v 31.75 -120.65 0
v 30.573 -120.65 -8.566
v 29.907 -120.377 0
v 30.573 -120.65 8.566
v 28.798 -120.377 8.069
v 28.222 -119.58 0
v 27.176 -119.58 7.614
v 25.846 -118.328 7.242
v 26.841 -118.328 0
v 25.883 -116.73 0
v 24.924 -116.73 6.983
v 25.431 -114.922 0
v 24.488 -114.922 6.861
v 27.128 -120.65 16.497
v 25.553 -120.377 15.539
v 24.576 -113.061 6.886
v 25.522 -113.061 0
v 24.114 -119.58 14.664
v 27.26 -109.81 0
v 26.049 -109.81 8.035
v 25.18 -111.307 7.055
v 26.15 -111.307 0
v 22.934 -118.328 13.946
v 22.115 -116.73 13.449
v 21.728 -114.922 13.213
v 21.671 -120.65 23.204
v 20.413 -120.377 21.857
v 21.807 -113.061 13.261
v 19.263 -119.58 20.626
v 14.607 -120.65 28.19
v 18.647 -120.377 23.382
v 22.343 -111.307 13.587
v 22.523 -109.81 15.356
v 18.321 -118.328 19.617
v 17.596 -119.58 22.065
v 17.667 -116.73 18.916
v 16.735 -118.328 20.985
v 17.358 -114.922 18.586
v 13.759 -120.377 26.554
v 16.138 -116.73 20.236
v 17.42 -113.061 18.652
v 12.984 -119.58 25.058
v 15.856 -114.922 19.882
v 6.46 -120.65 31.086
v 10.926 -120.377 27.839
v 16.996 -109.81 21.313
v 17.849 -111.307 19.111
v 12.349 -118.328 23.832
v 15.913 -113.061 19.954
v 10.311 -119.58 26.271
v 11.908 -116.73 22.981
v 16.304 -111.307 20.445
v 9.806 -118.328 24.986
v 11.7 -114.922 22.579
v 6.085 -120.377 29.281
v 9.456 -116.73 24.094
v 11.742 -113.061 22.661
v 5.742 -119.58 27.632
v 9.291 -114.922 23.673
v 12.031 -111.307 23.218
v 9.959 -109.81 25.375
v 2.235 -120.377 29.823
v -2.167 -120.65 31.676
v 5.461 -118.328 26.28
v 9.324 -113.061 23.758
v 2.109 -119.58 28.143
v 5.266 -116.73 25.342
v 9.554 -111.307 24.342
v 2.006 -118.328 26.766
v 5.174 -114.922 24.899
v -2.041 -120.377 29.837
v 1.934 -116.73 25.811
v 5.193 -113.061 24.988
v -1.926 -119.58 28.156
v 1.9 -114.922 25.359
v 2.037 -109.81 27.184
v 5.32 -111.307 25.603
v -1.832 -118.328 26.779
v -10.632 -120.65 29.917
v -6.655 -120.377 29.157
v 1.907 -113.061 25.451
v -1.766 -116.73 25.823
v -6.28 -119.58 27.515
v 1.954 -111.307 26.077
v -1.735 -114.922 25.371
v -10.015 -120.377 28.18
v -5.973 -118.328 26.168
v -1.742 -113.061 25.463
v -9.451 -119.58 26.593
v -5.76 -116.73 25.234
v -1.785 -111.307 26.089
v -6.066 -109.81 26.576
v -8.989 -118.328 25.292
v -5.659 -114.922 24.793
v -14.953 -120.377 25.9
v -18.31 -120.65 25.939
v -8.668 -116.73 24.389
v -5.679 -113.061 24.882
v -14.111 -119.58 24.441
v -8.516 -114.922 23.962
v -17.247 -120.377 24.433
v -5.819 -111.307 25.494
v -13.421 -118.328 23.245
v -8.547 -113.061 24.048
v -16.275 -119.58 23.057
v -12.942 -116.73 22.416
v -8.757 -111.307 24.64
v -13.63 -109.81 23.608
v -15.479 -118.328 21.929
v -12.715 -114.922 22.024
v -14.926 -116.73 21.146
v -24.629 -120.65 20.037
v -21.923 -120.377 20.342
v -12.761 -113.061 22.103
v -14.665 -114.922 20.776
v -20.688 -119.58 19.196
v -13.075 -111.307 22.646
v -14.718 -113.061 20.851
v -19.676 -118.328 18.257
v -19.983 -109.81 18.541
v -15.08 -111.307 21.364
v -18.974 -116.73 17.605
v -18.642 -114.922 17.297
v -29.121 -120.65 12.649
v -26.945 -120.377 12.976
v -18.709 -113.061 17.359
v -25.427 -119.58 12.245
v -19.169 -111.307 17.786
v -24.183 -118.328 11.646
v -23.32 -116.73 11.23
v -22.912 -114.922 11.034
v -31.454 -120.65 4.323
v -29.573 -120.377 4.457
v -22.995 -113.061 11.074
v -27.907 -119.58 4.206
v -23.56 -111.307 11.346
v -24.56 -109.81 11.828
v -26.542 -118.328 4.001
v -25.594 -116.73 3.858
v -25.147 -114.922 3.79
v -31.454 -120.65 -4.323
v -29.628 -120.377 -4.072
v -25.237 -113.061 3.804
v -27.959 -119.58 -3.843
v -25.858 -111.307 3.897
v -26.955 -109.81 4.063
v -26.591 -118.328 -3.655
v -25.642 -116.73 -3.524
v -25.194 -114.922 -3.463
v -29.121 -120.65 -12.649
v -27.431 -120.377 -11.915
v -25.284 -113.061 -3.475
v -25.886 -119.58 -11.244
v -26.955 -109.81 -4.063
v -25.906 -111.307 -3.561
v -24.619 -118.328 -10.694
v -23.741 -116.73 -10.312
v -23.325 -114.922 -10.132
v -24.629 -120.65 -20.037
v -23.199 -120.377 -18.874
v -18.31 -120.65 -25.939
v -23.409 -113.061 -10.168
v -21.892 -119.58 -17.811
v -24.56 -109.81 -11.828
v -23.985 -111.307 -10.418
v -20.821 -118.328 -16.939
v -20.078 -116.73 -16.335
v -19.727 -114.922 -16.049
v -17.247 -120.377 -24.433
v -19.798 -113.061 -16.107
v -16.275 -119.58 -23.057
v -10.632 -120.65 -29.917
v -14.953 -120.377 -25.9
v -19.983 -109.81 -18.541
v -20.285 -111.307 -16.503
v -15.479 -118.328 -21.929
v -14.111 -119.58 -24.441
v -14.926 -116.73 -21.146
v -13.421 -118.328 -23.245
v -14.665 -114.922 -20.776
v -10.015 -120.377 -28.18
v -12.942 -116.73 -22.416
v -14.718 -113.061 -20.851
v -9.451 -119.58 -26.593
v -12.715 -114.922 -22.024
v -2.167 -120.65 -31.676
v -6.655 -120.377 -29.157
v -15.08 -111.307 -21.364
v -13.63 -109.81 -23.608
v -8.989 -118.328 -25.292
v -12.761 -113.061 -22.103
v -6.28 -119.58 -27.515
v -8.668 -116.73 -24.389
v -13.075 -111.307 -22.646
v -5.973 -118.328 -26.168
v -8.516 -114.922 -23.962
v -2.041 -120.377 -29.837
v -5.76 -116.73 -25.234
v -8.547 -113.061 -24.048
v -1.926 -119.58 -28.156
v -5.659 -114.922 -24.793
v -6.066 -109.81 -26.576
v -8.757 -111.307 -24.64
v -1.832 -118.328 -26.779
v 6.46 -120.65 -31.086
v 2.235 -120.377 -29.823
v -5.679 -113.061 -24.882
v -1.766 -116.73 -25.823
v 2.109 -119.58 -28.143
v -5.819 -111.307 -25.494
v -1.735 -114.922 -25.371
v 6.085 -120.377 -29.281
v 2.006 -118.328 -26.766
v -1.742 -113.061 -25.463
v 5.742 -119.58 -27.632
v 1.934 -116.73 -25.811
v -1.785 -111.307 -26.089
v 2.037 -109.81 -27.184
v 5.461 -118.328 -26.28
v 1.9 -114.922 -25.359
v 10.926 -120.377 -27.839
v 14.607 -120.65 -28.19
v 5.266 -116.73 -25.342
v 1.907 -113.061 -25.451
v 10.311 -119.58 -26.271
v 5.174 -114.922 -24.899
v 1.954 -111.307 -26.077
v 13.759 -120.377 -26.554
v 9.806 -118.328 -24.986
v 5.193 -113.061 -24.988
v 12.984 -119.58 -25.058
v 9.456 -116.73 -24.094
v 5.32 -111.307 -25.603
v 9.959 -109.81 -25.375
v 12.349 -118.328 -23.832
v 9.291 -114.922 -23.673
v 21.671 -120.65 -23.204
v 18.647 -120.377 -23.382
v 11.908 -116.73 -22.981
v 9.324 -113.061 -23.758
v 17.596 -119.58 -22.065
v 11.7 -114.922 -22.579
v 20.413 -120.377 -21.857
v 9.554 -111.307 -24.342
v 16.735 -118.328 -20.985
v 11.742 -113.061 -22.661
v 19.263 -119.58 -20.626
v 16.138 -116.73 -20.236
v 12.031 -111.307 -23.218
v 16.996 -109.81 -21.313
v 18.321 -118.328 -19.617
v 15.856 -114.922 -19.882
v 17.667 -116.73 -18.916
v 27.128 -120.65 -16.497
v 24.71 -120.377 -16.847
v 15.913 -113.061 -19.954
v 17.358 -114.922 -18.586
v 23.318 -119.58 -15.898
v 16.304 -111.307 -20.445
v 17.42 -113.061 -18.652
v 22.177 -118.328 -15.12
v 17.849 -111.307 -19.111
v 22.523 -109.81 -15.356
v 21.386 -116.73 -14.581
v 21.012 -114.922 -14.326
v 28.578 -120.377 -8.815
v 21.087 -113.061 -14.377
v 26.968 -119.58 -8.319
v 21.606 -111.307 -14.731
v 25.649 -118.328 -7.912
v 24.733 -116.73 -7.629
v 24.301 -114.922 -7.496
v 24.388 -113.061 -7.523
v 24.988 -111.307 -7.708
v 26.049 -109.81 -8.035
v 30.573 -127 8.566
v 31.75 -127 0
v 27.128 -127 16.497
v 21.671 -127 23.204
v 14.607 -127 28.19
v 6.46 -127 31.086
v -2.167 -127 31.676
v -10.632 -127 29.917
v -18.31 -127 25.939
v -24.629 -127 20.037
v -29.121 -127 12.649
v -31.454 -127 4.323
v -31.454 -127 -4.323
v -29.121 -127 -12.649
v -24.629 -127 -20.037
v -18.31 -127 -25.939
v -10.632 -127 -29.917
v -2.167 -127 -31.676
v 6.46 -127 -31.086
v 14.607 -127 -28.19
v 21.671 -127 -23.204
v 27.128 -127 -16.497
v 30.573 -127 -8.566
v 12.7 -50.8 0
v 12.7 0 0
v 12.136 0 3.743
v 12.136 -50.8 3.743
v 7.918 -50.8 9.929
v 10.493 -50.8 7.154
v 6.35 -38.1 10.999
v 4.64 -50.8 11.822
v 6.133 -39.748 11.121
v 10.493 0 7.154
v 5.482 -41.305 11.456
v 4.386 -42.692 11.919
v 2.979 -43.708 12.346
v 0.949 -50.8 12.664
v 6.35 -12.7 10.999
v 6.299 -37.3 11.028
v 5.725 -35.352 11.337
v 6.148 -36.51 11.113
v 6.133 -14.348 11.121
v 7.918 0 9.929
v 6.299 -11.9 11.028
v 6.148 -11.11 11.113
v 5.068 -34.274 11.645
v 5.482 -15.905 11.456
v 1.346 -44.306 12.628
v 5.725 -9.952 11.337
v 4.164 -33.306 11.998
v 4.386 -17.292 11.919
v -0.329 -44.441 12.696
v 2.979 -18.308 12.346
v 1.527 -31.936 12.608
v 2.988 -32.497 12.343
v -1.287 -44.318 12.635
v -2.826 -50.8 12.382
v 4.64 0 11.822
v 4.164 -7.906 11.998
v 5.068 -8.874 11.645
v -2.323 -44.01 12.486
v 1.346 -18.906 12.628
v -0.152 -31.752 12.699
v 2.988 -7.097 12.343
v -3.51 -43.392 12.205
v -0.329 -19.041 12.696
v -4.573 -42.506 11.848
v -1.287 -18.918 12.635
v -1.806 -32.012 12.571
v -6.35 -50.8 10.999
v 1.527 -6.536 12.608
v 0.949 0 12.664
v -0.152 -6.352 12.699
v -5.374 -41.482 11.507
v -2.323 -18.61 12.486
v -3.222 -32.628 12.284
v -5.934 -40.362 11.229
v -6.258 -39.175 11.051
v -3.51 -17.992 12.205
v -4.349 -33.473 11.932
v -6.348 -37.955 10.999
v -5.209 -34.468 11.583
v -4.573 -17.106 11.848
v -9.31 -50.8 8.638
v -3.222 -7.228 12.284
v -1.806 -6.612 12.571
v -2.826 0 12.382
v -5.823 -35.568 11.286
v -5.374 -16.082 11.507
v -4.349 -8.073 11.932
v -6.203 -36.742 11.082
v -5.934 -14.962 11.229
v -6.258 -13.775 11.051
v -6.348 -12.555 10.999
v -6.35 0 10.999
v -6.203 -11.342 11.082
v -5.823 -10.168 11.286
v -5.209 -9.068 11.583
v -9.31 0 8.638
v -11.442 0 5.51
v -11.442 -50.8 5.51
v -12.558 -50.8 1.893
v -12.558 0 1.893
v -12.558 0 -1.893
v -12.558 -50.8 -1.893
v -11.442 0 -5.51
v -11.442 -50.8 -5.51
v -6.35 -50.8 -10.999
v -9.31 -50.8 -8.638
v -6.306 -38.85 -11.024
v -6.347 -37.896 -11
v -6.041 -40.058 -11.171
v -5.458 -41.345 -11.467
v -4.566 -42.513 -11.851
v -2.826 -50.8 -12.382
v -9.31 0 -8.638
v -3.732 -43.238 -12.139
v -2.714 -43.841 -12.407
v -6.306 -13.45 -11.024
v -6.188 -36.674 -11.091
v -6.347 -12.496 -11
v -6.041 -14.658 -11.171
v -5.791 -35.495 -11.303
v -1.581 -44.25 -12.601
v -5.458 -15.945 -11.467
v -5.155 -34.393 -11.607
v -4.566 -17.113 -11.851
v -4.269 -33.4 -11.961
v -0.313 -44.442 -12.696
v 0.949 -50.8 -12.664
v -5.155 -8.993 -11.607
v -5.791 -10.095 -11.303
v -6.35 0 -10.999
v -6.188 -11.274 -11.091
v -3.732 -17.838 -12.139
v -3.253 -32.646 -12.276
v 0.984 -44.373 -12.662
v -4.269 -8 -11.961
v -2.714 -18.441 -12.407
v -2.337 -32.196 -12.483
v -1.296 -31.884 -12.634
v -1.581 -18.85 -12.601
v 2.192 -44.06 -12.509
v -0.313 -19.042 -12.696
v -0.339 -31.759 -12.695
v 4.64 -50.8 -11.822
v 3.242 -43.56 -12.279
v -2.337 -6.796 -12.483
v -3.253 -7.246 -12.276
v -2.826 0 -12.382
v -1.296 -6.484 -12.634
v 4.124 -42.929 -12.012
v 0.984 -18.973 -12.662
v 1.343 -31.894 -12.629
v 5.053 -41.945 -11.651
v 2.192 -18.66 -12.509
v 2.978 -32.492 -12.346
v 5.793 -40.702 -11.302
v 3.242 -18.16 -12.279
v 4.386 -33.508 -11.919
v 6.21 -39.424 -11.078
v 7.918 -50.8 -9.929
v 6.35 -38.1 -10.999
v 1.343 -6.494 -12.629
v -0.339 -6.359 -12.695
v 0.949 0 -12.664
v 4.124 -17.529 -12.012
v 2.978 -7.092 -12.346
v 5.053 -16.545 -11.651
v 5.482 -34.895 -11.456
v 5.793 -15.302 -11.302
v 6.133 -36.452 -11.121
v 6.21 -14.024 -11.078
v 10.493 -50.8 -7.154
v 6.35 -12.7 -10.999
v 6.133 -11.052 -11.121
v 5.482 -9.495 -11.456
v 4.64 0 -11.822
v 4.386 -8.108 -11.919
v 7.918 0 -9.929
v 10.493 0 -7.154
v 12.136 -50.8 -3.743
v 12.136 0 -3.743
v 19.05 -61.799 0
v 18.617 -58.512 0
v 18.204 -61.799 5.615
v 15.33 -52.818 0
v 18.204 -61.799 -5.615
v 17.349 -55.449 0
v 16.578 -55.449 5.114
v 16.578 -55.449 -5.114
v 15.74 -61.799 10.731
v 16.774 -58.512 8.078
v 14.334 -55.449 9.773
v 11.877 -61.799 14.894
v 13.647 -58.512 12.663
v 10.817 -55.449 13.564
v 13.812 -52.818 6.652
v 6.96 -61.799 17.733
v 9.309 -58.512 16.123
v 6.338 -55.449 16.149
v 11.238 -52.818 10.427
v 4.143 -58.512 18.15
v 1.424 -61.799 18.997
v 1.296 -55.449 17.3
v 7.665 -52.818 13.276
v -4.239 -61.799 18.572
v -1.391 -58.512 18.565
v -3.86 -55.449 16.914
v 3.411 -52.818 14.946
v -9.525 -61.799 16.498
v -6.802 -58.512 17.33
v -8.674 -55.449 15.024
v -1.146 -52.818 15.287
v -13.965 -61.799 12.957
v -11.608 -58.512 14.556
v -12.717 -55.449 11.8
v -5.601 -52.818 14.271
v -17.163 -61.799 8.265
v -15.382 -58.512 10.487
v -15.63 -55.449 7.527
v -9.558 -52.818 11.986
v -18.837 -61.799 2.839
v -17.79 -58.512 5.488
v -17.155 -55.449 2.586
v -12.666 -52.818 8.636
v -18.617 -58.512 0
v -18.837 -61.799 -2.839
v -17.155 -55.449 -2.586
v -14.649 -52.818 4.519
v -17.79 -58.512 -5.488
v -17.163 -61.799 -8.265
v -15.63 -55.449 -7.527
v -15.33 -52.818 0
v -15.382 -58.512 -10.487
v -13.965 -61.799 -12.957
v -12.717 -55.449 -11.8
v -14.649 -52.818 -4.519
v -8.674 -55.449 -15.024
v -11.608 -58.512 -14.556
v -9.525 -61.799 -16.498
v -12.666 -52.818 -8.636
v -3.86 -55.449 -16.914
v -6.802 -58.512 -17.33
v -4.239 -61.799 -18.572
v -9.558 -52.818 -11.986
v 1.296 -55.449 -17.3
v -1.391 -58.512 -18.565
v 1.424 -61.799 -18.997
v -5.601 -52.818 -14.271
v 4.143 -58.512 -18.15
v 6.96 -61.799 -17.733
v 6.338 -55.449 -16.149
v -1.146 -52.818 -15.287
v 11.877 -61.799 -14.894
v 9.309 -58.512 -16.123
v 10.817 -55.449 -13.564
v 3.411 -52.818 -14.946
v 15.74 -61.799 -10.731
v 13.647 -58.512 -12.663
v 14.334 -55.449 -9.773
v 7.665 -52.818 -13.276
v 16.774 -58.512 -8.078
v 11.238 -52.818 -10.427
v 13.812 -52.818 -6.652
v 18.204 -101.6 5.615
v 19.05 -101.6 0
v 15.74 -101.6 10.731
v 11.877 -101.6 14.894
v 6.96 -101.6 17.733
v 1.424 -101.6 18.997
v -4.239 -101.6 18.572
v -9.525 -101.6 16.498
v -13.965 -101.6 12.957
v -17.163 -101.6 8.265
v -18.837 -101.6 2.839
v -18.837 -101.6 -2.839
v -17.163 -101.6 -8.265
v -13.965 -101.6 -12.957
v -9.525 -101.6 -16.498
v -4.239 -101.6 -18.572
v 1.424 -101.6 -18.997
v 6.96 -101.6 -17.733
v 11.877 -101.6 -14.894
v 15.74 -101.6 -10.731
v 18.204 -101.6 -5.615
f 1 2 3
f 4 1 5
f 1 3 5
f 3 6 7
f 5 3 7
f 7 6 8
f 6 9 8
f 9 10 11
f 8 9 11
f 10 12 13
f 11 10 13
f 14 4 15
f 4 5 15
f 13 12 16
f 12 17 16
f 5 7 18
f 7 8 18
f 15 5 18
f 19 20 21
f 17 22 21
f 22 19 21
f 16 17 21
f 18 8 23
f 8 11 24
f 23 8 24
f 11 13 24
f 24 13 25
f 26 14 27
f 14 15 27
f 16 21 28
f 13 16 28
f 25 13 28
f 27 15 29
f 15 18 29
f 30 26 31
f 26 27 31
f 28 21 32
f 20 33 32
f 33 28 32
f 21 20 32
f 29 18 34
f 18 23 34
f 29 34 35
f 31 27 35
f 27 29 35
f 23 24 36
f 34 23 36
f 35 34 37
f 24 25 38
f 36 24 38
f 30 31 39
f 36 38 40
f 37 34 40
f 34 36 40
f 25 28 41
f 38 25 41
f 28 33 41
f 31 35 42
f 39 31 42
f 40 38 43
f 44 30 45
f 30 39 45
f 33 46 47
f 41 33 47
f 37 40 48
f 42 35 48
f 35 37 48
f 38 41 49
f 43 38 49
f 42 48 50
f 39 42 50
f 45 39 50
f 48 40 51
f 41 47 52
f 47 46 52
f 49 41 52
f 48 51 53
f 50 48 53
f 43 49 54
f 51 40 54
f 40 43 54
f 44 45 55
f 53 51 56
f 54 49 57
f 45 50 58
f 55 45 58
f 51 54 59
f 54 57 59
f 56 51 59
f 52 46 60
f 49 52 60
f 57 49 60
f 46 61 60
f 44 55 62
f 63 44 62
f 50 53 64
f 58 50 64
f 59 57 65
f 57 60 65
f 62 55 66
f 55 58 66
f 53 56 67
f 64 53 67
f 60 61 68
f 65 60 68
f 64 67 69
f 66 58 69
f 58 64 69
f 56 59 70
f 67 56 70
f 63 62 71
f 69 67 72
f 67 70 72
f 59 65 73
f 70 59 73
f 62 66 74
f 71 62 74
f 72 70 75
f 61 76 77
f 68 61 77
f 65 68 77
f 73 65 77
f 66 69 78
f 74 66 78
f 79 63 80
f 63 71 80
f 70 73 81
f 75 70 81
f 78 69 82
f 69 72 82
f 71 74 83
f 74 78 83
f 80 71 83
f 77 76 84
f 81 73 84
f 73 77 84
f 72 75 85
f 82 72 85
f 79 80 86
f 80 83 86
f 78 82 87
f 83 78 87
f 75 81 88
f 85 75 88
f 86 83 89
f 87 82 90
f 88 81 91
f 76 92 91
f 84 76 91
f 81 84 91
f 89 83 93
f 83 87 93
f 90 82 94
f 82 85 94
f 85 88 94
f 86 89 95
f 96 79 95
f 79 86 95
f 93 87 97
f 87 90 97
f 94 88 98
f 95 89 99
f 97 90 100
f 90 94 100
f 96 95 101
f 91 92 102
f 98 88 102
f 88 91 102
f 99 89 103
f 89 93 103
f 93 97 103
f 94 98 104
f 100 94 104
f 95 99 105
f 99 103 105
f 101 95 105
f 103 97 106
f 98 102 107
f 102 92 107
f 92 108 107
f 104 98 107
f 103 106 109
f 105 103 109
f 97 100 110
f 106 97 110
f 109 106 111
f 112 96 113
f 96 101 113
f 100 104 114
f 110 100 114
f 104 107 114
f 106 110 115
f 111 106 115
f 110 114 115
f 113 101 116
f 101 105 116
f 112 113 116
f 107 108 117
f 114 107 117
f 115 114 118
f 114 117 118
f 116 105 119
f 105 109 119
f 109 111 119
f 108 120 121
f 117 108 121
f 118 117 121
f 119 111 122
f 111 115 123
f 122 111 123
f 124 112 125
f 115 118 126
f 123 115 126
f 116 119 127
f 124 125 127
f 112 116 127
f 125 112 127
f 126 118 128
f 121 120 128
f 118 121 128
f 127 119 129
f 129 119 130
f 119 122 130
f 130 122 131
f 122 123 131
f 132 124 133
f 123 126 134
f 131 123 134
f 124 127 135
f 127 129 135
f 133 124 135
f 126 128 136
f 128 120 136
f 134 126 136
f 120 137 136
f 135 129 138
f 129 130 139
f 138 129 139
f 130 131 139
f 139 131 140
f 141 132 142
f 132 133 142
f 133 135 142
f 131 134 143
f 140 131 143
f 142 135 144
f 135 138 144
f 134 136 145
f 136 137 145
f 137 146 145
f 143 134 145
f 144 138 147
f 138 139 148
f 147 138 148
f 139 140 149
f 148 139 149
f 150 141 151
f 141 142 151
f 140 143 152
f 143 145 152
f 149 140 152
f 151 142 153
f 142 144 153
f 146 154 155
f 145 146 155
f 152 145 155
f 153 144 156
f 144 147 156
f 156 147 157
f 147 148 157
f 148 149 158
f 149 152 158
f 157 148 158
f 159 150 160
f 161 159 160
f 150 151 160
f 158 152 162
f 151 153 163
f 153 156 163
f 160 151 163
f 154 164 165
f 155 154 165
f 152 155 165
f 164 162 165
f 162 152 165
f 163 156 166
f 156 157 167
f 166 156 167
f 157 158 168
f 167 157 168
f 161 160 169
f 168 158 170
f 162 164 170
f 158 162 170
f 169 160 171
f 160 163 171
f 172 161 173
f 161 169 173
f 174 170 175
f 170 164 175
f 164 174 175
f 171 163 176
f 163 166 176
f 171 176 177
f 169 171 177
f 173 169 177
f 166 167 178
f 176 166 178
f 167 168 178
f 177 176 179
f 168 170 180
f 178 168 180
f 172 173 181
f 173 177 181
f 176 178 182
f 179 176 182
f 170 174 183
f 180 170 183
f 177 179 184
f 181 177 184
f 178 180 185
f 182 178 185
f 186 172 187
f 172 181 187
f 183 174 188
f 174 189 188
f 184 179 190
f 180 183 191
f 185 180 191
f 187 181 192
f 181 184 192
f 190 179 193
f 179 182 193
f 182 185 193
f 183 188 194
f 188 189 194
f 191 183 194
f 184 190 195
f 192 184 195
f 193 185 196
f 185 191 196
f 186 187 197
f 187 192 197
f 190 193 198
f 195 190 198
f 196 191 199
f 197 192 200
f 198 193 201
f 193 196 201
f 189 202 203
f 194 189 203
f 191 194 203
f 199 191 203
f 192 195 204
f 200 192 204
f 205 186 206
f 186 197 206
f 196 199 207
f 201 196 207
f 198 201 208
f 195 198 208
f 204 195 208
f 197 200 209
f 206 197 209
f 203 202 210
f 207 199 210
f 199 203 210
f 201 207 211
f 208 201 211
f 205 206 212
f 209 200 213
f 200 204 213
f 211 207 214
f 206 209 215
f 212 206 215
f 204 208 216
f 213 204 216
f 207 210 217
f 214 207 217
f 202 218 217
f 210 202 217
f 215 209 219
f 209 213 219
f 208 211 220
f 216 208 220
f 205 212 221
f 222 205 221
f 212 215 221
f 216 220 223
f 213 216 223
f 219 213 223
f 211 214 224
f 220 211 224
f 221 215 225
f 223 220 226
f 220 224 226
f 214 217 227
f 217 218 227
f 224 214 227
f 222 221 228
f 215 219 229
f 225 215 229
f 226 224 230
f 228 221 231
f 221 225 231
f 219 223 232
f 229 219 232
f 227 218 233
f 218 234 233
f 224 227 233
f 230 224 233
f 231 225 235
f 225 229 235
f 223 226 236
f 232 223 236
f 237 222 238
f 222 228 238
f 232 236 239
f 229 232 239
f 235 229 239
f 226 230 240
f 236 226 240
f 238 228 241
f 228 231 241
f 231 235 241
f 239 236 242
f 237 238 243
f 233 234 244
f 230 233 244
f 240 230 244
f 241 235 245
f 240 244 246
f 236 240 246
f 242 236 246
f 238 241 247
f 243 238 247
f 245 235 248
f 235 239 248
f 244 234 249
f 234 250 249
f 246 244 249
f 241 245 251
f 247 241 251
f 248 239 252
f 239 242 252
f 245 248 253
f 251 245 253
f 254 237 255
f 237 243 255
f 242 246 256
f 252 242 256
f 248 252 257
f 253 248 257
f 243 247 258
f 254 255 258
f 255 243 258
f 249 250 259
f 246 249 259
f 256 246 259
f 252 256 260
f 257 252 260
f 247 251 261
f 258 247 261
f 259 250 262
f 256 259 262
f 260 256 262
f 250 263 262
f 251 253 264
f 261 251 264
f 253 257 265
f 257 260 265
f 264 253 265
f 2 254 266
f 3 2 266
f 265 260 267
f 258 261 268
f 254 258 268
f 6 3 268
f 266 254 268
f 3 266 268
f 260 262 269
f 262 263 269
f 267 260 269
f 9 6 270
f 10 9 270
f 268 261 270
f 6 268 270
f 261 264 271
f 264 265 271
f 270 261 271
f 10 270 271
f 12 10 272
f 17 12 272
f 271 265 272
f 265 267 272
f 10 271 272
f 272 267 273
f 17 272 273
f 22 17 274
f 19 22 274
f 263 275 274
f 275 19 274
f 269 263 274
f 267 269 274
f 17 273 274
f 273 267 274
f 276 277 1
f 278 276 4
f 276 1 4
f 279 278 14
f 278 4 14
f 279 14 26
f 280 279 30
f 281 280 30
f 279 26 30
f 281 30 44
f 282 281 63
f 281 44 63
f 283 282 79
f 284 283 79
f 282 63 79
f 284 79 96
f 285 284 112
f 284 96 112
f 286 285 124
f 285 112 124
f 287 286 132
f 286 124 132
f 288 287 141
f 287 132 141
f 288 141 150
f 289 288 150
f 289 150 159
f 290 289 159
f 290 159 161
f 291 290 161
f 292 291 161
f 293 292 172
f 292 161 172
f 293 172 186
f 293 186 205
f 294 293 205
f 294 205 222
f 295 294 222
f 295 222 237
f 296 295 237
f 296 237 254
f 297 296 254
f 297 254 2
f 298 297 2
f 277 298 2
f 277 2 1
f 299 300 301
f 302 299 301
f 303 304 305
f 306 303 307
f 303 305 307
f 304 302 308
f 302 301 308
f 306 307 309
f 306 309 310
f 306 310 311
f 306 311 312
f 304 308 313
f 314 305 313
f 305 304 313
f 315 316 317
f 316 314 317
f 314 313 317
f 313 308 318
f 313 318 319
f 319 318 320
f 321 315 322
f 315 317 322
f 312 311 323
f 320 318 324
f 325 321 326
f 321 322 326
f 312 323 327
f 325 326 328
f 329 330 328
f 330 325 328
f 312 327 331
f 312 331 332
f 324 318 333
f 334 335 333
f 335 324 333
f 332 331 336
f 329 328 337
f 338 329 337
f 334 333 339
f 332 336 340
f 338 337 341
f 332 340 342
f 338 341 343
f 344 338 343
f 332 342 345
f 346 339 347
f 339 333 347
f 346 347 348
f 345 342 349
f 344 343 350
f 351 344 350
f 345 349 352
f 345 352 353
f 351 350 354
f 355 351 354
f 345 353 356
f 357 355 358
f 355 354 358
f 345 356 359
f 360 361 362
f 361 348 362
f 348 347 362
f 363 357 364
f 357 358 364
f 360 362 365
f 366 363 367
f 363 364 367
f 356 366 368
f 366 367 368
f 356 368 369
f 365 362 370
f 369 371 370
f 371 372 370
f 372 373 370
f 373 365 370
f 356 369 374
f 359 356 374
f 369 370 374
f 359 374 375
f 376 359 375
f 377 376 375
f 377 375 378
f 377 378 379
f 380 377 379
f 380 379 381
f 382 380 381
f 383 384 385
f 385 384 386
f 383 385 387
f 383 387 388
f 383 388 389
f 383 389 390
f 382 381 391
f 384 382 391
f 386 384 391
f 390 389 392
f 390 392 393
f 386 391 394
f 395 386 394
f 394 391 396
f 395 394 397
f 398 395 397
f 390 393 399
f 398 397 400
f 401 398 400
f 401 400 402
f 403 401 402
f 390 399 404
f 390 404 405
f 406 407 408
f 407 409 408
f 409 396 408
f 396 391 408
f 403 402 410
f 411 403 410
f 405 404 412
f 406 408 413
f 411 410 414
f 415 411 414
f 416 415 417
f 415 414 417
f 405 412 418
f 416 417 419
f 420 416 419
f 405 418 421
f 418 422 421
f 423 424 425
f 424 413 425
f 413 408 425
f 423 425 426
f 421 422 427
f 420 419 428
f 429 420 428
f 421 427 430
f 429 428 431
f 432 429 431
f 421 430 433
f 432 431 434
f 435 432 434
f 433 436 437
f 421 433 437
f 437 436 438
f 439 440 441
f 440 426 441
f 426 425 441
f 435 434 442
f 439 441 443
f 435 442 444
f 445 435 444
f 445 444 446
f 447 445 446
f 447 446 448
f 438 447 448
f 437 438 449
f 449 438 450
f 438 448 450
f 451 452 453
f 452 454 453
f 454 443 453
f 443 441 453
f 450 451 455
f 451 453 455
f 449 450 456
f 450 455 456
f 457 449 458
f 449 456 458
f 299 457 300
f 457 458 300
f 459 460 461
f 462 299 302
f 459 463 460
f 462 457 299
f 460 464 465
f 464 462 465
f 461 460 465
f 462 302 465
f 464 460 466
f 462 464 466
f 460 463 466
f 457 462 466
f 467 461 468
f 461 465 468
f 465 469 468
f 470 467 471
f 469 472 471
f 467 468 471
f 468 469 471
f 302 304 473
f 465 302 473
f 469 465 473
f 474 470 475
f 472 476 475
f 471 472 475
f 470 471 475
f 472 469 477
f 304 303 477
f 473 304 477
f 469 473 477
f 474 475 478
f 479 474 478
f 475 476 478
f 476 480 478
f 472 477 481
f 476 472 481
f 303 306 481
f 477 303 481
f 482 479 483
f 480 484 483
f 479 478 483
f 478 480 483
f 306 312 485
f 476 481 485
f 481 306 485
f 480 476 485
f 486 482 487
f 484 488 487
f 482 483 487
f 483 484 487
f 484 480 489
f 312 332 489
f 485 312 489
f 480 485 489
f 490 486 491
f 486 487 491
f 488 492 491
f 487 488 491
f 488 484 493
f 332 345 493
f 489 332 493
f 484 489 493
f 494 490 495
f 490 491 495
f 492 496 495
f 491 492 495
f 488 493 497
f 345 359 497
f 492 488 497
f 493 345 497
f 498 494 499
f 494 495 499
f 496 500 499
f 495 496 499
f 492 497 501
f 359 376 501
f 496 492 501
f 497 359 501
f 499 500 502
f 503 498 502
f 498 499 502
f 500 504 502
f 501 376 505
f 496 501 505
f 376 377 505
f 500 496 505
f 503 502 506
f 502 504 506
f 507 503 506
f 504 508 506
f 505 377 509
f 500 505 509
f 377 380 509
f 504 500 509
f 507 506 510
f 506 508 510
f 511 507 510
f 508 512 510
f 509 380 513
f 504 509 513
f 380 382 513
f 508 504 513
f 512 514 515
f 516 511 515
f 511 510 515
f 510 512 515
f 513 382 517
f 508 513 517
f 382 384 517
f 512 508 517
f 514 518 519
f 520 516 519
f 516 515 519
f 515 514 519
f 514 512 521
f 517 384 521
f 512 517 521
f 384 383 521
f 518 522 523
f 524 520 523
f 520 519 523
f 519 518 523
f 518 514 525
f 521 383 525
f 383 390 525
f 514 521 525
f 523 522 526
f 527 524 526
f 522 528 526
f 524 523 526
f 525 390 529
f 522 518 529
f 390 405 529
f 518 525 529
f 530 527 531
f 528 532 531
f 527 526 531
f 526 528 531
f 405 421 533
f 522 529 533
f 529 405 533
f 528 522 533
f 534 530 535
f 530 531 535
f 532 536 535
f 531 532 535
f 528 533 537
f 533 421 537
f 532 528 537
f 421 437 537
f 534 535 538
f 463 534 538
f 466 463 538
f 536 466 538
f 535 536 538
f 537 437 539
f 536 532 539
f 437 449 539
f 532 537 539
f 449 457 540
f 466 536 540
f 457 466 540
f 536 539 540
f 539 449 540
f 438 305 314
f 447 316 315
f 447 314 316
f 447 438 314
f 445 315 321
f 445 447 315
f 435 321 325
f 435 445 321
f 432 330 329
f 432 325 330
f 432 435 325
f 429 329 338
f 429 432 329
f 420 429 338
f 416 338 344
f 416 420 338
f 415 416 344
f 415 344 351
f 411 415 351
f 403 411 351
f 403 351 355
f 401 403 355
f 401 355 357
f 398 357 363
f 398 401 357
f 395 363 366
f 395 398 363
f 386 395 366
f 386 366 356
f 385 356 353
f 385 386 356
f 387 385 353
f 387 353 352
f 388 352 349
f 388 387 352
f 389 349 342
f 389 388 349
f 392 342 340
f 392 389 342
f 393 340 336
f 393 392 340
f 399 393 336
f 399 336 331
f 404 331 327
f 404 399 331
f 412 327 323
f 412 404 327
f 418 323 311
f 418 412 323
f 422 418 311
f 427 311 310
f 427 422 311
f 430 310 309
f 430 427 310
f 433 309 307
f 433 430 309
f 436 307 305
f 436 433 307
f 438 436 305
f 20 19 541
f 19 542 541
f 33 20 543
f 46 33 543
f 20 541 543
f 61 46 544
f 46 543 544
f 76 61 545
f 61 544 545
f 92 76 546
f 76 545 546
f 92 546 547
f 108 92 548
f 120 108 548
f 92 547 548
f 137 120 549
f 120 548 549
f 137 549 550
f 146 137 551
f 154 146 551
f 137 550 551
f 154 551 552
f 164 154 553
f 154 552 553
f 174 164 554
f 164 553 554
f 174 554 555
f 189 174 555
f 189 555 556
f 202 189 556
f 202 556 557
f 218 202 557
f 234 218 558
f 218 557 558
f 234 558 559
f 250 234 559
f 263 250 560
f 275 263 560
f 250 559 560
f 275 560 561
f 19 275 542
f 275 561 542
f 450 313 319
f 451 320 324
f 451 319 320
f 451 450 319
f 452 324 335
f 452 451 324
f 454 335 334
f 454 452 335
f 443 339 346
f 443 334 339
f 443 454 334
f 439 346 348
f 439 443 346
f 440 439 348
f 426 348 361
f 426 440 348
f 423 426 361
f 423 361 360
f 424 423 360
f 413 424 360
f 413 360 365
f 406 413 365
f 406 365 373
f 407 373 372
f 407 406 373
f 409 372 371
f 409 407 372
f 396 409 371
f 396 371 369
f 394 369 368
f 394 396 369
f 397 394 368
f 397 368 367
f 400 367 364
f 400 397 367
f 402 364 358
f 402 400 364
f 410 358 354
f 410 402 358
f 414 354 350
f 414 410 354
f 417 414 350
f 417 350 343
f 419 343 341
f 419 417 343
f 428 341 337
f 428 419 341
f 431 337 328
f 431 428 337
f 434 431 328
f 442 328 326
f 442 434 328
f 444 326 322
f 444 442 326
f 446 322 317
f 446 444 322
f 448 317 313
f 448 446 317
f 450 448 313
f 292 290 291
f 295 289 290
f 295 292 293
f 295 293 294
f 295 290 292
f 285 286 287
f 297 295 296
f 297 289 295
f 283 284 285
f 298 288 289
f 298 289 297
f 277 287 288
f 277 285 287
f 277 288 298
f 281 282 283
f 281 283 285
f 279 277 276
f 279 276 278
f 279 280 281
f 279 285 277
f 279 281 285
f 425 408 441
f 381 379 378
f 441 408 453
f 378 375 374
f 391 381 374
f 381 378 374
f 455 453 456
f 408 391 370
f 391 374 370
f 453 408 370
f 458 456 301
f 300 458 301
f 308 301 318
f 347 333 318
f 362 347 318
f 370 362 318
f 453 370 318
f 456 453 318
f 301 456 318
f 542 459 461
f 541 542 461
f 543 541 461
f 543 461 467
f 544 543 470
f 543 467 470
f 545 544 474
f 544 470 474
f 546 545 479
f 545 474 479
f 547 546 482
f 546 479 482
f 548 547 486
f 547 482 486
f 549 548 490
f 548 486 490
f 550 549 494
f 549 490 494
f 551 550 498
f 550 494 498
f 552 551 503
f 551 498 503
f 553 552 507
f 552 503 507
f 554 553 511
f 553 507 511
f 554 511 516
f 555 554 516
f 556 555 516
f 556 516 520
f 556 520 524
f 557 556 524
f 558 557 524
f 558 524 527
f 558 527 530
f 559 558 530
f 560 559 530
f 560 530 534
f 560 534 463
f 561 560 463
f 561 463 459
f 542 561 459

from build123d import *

# Parameters (mm, degrees)
F0_R          = 12.7
F1_DEPTH      = 50.8
F2_R          = 19.05
F3_DEPTH      = 50.8
F4_R          = 31.75
F5_DEPTH      = 25.4
F6_R          = 6.35
F7_DEPTH      = 12.7
F7_DEPTH_BACK = 12.7
F8_R          = 6.35
F9_DEPTH      = 12.7
F9_DEPTH_BACK = 12.7
F13_R         = 6.35
F15_S5_R      = 19.05
F15_T6_DEPTH  = 47


# Not quite as in the source:
# - a fillet or chamfer that OpenCascade refuses, or shapes differently, is made with other operations: its cross-section is extruded or revolved along the edge and cut away or added


with BuildPart() as f1:
    # F0 (on Front) → F1 (new body)
    with BuildSketch(Plane.XZ):
        Circle(F0_R)
    extrude(amount=F1_DEPTH)

    # F2 (on face) → F3 (join)
    with BuildSketch(Plane.XZ.offset(50.8)):
        Circle(F2_R)
    extrude(amount=F3_DEPTH)

    # F4 (on face) → F5 (join)
    with BuildSketch(Plane.XZ.offset(101.6)):
        Circle(F4_R)
    extrude(amount=F5_DEPTH)

    # F6 (on Top) → F7 (cut, two sides)
    with BuildSketch(Plane.XY) as f7_sk:
        with Locations((0, -38.1)):
            Circle(F6_R)
    extrude(amount=-F7_DEPTH, mode=Mode.SUBTRACT)
    extrude(f7_sk.sketch, amount=F7_DEPTH_BACK, mode=Mode.SUBTRACT)

    # F8 (on Top) → F9 (cut, two sides)
    with BuildSketch(Plane.XY) as f9_sk:
        with Locations((0, -12.7)):
            Circle(F8_R)
    extrude(amount=-F9_DEPTH, mode=Mode.SUBTRACT)
    extrude(f9_sk.sketch, amount=F9_DEPTH_BACK, mode=Mode.SUBTRACT)

    # F10: fillet of radius 12.7 on 1 edges, made by hand

    # F10_s1 → F10_t2 (revolve, cut)
    with BuildSketch(Plane.XY):
        with BuildLine():
            ThreePointArc((19.05, -61.7985226281), (17.3485226281, -55.4485226281), (12.7, -50.8))
            Line((12.7, -50.8), (19.05, -50.8))
            Line((19.05, -50.8), (19.05, -61.7985226281))
        make_face()
    revolve(axis=Axis((0, -50.8, 0), (0, -1, 0)), mode=Mode.SUBTRACT)

    # F14: sweep along a path in F12
    with BuildLine(Plane.XZ.offset(114.3)) as f14_path:
        CenterArc((0, 0), 31.75, 0, 360)
    # F13 (on Right) → F14 (sweep, cut)
    with BuildSketch(Plane.YZ):
        with Locations((-114.3, 31.75)):
            Circle(F13_R)
    sweep(path=f14_path.line, mode=Mode.SUBTRACT)

    # F15: chamfer of 12.7 on 1 edges, made by hand


with BuildPart() as f15_tool2:
    # F15_s3 → F15_t4 (revolve)
    with BuildSketch(Plane.XY):
        Polygon((31.75, -114.3), (19.05, -101.6), (31.75, -101.6), align=None)
    revolve(axis=Axis((0, -101.6, 0), (0, -1, 0)))

    # F15_s5 → F15_t6 (cut, symmetric)
    with BuildSketch(Plane.XZ.offset(108)):
        Circle(F15_S5_R)
    extrude(amount=F15_T6_DEPTH, both=True, mode=Mode.SUBTRACT)


with BuildPart() as f1_1:
    add(f1.part)

    # F15_t1: cut F15_tool2
    add(f15_tool2.part, mode=Mode.SUBTRACT)


solid = f1_1.part
